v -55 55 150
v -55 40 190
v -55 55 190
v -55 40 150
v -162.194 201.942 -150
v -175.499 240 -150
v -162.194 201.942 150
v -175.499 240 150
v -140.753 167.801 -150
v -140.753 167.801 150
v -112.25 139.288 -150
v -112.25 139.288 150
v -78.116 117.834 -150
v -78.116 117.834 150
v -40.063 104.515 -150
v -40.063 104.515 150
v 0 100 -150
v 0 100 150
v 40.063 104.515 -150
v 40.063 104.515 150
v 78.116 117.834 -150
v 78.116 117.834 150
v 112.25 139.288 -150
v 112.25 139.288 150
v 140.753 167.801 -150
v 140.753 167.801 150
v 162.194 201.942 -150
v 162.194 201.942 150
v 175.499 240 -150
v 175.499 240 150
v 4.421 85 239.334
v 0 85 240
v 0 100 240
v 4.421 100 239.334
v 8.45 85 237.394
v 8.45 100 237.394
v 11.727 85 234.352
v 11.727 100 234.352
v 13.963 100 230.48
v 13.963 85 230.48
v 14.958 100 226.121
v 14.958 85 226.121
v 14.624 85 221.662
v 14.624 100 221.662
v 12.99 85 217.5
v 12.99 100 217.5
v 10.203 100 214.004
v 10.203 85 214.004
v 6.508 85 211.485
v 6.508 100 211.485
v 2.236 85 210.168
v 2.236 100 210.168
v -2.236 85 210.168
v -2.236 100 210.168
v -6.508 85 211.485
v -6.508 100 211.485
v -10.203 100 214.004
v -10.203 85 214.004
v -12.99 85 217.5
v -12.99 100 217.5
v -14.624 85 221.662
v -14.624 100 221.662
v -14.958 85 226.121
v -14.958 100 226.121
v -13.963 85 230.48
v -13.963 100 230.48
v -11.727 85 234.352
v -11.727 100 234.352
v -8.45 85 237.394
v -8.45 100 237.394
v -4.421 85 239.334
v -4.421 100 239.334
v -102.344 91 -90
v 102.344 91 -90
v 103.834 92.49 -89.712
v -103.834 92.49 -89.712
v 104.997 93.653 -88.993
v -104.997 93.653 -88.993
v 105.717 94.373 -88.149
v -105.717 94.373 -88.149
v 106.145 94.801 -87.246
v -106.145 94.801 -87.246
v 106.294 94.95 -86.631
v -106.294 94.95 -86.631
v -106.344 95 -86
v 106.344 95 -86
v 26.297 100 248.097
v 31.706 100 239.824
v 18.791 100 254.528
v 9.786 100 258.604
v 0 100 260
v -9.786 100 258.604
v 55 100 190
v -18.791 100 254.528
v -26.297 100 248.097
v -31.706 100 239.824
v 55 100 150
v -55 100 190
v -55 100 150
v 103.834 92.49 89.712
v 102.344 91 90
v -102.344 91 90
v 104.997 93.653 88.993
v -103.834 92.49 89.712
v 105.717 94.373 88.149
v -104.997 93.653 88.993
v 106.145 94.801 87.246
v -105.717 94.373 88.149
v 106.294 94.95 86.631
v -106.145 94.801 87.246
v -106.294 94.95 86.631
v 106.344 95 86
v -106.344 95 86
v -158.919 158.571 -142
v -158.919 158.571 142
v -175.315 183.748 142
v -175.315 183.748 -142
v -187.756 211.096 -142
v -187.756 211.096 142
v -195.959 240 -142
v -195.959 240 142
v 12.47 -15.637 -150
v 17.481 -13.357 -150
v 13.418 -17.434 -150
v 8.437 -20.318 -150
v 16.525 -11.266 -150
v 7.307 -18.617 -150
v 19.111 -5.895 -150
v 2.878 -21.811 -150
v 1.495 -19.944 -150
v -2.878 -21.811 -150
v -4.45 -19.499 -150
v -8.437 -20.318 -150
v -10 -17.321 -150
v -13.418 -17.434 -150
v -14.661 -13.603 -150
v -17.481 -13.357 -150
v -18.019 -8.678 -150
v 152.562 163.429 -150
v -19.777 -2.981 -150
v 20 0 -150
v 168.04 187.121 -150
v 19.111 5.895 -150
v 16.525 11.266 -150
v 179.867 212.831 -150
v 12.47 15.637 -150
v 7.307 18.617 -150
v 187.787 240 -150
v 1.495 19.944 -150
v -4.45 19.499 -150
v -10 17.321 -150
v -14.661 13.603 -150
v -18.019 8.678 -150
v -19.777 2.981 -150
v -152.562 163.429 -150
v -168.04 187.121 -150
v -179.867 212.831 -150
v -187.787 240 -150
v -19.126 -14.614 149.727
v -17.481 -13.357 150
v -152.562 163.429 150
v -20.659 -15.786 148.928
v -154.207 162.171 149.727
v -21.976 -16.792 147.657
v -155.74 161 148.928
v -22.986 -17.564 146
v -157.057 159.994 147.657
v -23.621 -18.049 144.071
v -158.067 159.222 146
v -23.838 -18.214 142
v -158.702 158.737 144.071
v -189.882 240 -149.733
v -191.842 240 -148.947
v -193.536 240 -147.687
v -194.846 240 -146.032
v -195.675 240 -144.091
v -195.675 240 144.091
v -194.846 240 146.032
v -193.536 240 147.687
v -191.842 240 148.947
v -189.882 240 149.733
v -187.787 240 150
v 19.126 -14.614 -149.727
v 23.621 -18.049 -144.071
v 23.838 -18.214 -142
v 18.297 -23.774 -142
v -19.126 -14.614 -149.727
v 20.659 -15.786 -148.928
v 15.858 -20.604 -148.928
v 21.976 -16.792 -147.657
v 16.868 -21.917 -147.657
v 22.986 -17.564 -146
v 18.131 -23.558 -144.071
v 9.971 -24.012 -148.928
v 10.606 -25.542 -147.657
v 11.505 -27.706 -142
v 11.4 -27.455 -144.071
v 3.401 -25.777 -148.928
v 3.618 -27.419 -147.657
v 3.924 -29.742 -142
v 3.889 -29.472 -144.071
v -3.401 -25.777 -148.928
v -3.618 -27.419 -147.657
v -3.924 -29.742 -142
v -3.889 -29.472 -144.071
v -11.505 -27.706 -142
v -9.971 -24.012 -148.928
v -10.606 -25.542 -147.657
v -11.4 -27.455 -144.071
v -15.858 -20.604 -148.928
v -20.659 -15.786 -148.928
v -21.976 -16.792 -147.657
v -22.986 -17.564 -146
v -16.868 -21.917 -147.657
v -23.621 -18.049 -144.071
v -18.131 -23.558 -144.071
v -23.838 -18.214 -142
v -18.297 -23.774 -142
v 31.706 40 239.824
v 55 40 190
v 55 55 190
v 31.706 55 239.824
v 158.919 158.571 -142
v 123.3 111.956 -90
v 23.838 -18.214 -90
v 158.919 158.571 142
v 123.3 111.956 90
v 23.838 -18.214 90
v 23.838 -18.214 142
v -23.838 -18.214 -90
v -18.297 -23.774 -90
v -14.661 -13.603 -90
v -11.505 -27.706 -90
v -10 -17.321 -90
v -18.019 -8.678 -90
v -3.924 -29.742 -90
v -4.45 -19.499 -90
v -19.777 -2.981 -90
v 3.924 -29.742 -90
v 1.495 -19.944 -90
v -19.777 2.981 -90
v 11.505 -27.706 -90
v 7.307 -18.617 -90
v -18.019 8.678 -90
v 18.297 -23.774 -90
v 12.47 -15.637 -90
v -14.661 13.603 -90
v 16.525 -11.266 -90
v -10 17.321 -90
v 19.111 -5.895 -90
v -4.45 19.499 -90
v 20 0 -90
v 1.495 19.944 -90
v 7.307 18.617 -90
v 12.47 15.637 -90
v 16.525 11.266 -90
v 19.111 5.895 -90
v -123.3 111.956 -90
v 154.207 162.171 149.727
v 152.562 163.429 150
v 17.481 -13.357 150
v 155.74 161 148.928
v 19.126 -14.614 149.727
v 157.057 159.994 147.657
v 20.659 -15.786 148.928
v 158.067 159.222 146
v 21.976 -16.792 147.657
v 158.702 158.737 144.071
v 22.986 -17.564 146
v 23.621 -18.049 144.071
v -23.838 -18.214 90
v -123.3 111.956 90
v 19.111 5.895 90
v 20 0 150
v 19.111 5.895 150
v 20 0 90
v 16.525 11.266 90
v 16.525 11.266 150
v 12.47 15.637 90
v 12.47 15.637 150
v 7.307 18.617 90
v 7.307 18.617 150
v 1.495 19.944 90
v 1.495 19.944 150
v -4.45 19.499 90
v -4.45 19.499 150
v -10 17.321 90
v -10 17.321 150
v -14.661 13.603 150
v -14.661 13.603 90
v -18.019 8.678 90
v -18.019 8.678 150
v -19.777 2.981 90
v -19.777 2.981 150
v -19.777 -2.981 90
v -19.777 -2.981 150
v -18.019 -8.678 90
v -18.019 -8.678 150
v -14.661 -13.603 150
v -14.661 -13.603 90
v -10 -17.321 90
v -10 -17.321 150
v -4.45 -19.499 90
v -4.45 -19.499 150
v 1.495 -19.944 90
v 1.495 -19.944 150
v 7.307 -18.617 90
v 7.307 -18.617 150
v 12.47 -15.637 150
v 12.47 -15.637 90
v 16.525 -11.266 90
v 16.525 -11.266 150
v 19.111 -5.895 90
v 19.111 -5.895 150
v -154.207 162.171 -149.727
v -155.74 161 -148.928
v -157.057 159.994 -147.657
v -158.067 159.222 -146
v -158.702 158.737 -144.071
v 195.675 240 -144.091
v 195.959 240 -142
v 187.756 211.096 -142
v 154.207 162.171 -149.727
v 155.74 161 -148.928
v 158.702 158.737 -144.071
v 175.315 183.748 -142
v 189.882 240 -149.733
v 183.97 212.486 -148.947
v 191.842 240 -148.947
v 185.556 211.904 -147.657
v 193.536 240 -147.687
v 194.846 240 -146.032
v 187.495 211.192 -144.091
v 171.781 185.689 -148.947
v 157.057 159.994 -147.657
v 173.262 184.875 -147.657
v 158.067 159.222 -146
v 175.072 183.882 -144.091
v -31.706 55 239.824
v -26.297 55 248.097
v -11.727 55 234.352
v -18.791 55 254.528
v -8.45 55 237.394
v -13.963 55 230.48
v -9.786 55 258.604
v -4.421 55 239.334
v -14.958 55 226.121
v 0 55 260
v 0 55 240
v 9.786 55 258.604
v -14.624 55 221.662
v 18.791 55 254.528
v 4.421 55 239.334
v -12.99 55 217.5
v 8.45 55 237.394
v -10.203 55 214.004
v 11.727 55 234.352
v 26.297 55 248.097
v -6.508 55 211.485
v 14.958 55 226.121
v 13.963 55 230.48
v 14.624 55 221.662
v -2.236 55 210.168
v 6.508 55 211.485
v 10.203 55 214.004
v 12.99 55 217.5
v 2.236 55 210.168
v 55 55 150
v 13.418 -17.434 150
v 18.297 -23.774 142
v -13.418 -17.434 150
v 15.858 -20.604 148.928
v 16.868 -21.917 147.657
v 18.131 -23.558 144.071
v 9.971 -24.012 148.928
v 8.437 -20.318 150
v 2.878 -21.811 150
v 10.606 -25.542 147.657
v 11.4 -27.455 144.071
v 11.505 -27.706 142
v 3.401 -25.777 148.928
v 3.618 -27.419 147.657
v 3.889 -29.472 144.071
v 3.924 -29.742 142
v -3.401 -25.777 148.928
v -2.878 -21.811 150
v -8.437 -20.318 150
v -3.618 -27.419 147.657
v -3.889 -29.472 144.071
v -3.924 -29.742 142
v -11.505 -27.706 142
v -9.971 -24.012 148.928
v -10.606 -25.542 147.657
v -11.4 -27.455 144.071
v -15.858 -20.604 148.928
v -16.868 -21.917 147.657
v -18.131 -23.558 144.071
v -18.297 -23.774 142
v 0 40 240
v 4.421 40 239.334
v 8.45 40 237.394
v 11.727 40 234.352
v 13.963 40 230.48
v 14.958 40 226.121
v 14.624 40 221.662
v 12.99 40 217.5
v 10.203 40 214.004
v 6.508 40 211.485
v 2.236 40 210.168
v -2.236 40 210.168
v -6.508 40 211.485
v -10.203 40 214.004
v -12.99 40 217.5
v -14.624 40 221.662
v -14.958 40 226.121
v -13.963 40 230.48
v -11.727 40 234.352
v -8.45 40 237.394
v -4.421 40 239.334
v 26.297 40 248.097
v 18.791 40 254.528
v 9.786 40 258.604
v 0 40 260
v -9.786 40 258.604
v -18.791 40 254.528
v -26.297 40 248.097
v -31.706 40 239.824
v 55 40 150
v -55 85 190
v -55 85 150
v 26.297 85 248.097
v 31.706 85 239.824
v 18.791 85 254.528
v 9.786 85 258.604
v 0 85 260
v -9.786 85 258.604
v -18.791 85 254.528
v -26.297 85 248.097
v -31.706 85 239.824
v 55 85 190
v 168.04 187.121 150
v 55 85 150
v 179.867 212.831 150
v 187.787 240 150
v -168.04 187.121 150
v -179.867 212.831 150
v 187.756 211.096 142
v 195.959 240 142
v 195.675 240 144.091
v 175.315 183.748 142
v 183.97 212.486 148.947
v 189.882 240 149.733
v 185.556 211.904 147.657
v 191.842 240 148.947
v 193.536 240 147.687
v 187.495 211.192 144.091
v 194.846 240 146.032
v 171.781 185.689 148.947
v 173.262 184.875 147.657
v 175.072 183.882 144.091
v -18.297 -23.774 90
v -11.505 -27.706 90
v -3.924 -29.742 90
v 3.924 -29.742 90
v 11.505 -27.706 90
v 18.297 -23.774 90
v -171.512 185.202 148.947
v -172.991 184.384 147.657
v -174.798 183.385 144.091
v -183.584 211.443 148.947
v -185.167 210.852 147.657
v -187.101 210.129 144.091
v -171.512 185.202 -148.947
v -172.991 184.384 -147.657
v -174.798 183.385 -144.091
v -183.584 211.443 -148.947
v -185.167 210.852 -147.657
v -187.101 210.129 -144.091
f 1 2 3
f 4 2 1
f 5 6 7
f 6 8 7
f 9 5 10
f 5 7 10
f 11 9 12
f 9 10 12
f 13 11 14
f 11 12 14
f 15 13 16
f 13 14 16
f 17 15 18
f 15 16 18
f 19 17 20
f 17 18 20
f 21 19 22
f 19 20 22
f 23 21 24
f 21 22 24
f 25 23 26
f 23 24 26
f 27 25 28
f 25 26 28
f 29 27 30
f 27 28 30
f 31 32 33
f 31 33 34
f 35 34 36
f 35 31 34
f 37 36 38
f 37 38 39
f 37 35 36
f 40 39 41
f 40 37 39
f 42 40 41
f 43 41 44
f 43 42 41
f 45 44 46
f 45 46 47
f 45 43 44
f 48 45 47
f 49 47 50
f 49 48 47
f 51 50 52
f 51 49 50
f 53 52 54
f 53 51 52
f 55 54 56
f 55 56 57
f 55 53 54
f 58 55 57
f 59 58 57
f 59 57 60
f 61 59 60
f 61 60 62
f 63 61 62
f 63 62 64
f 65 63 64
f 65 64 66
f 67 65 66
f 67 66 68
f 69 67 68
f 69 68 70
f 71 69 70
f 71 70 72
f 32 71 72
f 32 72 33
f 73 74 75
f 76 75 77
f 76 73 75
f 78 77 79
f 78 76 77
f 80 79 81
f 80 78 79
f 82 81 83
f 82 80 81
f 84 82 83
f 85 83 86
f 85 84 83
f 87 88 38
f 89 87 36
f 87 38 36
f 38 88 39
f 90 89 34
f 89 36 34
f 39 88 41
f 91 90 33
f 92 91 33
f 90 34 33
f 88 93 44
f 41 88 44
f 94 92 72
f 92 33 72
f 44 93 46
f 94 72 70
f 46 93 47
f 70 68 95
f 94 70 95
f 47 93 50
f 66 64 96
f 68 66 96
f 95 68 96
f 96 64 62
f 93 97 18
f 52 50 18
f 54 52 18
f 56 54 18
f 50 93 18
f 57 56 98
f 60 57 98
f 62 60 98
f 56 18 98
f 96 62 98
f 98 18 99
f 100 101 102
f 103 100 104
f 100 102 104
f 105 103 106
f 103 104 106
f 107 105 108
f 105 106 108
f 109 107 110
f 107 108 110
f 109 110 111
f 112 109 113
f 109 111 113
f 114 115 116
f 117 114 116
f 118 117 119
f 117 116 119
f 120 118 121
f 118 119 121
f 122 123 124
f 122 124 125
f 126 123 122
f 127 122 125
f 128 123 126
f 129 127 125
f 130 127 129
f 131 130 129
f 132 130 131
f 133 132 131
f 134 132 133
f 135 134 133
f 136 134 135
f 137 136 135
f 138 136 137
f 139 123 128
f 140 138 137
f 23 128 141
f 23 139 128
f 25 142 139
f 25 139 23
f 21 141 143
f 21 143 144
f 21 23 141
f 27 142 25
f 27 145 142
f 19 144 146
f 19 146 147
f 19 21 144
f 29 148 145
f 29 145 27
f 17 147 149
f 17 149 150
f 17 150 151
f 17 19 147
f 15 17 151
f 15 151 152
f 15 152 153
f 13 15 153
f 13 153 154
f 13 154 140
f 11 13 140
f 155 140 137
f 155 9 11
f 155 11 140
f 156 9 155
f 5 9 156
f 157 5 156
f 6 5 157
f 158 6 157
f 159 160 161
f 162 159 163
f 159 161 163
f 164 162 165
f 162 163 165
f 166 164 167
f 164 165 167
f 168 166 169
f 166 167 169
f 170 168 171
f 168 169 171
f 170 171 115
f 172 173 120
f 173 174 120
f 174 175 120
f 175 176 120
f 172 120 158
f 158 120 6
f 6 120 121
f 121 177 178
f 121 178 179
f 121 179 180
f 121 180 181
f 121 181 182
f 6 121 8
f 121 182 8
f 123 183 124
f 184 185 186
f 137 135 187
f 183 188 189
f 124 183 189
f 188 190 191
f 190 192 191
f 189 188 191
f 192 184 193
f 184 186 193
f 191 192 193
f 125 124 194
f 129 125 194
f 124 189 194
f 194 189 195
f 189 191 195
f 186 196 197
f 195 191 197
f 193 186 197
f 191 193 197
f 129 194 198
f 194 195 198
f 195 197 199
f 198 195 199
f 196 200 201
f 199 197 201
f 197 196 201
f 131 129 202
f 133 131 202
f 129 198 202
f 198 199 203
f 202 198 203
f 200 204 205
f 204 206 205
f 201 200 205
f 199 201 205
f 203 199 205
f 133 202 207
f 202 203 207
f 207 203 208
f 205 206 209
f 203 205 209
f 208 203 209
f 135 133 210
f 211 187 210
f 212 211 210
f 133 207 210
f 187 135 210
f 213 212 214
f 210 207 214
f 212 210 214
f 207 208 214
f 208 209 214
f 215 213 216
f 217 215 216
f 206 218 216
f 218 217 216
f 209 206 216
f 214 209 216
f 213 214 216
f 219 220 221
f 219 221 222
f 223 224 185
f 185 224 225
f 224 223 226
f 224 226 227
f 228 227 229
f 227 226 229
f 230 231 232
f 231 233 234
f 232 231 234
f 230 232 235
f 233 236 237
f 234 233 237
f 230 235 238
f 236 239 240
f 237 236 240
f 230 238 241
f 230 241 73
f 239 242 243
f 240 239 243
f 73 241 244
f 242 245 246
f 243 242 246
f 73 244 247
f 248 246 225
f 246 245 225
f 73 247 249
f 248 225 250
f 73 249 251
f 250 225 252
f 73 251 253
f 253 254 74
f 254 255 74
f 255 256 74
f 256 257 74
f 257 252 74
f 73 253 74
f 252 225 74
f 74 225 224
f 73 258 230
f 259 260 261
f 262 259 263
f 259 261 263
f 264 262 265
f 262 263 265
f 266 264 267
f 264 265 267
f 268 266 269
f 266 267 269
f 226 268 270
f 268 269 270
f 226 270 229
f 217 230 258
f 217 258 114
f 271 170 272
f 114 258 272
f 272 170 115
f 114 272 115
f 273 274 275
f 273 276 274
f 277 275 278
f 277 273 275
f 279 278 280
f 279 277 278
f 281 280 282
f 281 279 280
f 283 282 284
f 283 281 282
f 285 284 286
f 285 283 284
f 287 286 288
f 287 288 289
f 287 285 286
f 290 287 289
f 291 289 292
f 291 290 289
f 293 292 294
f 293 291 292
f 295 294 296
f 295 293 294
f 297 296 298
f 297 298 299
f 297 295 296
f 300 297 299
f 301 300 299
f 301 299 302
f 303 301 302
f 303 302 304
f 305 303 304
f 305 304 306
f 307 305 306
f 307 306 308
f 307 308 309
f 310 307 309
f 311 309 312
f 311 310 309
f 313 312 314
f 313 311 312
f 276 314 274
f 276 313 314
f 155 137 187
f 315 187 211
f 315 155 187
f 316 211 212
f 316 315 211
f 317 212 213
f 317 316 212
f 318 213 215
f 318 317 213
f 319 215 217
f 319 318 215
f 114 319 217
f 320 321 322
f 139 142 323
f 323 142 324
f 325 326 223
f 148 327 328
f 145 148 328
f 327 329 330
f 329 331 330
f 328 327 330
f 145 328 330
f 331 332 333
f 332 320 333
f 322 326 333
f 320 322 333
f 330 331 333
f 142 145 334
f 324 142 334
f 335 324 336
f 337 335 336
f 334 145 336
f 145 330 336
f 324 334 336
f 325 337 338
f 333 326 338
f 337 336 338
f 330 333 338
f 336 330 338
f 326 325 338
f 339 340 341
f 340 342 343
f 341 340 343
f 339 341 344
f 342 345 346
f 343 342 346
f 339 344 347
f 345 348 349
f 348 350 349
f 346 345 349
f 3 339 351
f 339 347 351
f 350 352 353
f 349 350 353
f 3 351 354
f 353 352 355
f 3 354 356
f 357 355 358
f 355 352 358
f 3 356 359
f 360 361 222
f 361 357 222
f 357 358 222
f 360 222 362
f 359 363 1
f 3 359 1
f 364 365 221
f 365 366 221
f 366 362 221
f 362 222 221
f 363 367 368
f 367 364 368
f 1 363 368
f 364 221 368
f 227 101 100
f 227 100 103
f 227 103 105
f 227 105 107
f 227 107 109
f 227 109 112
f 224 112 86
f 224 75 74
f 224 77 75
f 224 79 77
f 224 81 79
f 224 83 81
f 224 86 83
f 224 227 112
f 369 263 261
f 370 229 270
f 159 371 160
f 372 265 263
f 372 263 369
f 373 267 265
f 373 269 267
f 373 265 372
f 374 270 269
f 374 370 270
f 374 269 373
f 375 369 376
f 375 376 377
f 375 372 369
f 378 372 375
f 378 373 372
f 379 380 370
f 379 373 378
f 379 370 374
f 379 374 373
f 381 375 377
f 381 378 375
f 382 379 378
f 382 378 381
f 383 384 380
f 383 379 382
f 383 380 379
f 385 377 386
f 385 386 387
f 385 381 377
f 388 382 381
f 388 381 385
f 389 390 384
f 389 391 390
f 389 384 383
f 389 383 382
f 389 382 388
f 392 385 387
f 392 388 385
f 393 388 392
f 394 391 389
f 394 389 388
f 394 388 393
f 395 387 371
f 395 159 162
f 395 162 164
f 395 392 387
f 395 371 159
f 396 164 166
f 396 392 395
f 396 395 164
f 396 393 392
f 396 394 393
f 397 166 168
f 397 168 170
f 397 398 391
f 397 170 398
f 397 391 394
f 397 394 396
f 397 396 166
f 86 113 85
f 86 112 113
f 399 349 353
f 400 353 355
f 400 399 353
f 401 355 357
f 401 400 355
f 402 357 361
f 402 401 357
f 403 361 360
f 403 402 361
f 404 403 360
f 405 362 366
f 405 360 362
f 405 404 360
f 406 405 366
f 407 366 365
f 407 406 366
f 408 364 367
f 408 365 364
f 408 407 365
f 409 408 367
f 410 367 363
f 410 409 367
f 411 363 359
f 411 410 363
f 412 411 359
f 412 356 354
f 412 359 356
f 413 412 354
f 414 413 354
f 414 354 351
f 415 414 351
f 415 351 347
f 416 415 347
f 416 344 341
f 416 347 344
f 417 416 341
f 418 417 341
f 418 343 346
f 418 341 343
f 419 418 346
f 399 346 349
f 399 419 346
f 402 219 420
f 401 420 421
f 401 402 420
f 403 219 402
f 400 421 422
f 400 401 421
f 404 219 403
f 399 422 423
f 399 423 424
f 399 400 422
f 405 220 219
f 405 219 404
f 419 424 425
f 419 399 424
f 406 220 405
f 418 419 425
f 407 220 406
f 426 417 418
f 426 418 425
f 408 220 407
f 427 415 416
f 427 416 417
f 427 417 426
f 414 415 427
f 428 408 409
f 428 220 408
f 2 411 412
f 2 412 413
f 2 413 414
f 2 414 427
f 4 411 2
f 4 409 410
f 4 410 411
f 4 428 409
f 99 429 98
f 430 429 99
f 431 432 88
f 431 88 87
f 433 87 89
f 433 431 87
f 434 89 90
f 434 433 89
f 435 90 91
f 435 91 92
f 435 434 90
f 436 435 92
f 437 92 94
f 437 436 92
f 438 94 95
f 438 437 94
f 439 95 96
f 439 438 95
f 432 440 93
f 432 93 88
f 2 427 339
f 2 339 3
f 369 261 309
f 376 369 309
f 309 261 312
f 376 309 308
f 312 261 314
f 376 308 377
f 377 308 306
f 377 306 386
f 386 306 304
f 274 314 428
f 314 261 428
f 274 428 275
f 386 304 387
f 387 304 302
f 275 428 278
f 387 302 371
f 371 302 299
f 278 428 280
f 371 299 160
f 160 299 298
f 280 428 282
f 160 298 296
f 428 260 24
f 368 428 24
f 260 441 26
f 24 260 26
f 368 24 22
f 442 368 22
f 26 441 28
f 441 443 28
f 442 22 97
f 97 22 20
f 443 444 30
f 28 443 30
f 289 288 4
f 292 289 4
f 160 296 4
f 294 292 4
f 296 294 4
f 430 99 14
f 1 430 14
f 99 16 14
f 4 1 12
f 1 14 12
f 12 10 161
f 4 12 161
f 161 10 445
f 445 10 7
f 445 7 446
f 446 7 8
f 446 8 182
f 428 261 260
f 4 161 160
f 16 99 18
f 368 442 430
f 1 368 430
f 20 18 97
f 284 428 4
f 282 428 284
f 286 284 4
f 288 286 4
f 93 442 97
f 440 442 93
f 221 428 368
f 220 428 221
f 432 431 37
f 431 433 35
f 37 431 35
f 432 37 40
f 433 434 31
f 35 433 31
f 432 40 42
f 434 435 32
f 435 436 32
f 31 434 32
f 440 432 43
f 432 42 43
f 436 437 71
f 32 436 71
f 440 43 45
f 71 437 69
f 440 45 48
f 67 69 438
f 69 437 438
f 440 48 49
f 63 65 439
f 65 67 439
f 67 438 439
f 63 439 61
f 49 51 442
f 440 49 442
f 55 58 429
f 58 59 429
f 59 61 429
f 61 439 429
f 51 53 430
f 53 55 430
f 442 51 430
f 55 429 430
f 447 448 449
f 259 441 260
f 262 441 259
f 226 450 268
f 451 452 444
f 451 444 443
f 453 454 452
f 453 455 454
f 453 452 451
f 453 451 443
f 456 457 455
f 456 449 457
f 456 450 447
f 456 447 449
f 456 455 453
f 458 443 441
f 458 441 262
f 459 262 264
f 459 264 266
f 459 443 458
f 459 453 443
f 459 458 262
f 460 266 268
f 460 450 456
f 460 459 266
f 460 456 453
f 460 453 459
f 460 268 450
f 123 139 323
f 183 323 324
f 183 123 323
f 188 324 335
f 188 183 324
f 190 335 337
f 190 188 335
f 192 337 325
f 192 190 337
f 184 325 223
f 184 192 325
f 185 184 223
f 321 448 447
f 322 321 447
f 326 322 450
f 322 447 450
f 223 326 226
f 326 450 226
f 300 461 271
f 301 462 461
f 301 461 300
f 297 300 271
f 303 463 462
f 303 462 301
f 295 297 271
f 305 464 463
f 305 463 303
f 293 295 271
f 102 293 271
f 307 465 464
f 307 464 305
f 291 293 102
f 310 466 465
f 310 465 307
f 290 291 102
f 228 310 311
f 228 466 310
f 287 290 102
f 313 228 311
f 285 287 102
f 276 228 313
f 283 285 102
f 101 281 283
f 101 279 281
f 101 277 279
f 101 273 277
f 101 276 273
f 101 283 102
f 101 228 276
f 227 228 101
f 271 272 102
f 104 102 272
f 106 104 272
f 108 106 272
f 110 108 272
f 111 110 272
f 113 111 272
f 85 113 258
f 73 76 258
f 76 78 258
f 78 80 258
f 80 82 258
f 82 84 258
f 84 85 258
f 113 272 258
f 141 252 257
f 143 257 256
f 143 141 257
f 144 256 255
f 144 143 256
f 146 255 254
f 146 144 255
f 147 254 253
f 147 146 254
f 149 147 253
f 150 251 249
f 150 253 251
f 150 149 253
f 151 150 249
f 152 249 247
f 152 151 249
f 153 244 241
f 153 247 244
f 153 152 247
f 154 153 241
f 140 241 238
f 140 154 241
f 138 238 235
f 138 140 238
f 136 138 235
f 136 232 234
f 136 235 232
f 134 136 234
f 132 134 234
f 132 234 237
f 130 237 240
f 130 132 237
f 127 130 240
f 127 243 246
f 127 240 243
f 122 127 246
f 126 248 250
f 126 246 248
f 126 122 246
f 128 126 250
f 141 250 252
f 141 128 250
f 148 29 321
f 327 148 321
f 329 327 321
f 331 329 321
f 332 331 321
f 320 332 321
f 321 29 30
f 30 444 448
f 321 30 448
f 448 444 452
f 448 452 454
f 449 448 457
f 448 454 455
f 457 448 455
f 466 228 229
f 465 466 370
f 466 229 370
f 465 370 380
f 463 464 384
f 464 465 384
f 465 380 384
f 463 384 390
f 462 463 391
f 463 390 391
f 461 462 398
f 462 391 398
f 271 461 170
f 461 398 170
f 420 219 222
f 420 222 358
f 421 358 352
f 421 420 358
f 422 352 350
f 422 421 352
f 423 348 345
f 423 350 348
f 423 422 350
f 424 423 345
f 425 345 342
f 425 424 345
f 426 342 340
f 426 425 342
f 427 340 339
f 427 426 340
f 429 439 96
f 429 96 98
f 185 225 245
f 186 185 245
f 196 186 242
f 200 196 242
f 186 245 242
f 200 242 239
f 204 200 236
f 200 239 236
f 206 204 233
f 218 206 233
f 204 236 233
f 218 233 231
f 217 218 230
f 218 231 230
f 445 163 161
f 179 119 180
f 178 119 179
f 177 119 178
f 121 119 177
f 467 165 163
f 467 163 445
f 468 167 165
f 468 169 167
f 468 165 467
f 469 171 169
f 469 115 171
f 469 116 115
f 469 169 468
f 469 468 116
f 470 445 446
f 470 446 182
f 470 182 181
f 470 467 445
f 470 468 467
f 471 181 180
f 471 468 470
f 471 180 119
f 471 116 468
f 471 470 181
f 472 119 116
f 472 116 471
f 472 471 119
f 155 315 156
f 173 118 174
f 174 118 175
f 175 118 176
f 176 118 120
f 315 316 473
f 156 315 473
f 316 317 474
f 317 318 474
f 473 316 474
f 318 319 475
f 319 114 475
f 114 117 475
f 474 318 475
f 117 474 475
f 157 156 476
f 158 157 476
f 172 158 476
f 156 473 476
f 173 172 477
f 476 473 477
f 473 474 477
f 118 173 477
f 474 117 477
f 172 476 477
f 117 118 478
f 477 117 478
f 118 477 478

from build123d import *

# Parameters (mm, degrees)
SKETCH1_R               = 20
BOSS_EXTRUDE1_DEPTH     = 150
BOSS_EXTRUDE2_START     = 40
SKETCH2_R               = 15
BOSS_EXTRUDE2_DEPTH     = 60
SKETCH3_W               = 162.009512726
SKETCH3_H               = 30
CUT_EXTRUDE1_DEPTH      = 405.474968323
CUT_EXTRUDE1_DEPTH_BACK = 405.474968323
SKETCH4_W               = 180
SKETCH4_H               = 153.149018845
CUT_EXTRUDE2_DEPTH      = 405.474968323
CUT_EXTRUDE2_DEPTH_BACK = 405.474968323
CHAMFER1_SIZE           = 4
CHAMFER1_SIZE2          = 21.339042193
CHAMFER1_EDGE_2_SIZE    = 4
CHAMFER1_EDGE_2_SIZE2   = 21.339042193
FILLET1_R               = 4
FILLET2_R               = 8


with BuildPart() as part:
    # Sketch1 → Boss-Extrude1 (new, symmetric)
    with BuildSketch(Plane.XY):
        with BuildLine():
            Line((-195.959179423, 240), (-175.499287748, 240))
            ThreePointArc((-175.499287748, 240), (0, 100), (175.499287748, 240))
            Line((175.499287748, 240), (195.959179423, 240))
            ThreePointArc((195.959179423, 240), (182.049998135, 197.188176092), (158.918539009, 158.571428571))
            Line((158.918539009, 158.571428571), (23.837780851, -18.214285714))
            ThreePointArc((23.837780851, -18.214285714), (0, -30), (-23.837780851, -18.214285714))
            Line((-23.837780851, -18.214285714), (-158.918539009, 158.571428571))
            ThreePointArc((-158.918539009, 158.571428571), (-182.049998135, 197.188176092), (-195.959179423, 240))
        make_face()
        Circle(SKETCH1_R, mode=Mode.SUBTRACT)
    extrude(amount=BOSS_EXTRUDE1_DEPTH, both=True)

    # Sketch2 → Boss-Extrude2 (add)
    with BuildSketch(Plane(origin=(0, 0, 0), x_dir=(1, 0, 0), z_dir=(0, 1, 0)).offset(BOSS_EXTRUDE2_START)):
        with BuildLine():
            Line((-55, -150), (55, -150))
            Line((55, -150), (55, -190))
            Line((55, -190), (31.705882353, -239.823529412))
            ThreePointArc((31.705882353, -239.823529412), (0, -260), (-31.705882353, -239.823529412))
            Line((-31.705882353, -239.823529412), (-55, -190))
            Line((-55, -190), (-55, -150))
        make_face()
        with Locations(Location((0, -225, 0), (0, 0, 270))):
            Circle(SKETCH2_R, mode=Mode.SUBTRACT)
    extrude(amount=BOSS_EXTRUDE2_DEPTH)

    # Sketch3 → Cut-Extrude1 (cut, two sides)
    with BuildSketch(Plane(origin=(0, 0, 0), x_dir=(0, 0, -1), z_dir=(1, 0, 0))) as cut_extrude1_sk:
        with Locations((-231.004756363, 70)):
            Rectangle(SKETCH3_W, SKETCH3_H)
    extrude(amount=CUT_EXTRUDE1_DEPTH, mode=Mode.SUBTRACT)
    extrude(cut_extrude1_sk.sketch, amount=-CUT_EXTRUDE1_DEPTH_BACK, mode=Mode.SUBTRACT)

    # Sketch4 → Cut-Extrude2 (cut, two sides)
    with BuildSketch(Plane(origin=(0, 0, 0), x_dir=(0, 0, -1), z_dir=(1, 0, 0))) as cut_extrude2_sk:
        with Locations((0, 18.425490577)):
            Rectangle(SKETCH4_W, SKETCH4_H)
    extrude(amount=CUT_EXTRUDE2_DEPTH, mode=Mode.SUBTRACT)
    extrude(cut_extrude2_sk.sketch, amount=-CUT_EXTRUDE2_DEPTH_BACK, mode=Mode.SUBTRACT)

    # Chamfer1
    chamfer1_edges = [part.edges().sort_by_distance(p)[0] for p in [
        (110.344044156, 95, 0),
    ]]
    chamfer1_side = [part.faces().sort_by_distance(p)[0] for p in [
        (0, 95, 0),
    ]]
    chamfer(chamfer1_edges, length=CHAMFER1_SIZE, length2=CHAMFER1_SIZE2, reference=chamfer1_side[0])

    # Chamfer1 edge 2
    chamfer1_edge_2_edges = [part.edges().sort_by_distance(p)[0] for p in [
        (-110.344044156, 95, 0),
    ]]
    chamfer1_edge_2_side = [part.faces().sort_by_distance(p)[0] for p in [
        (0, 95, 0),
    ]]
    chamfer(chamfer1_edge_2_edges, length=CHAMFER1_EDGE_2_SIZE, length2=CHAMFER1_EDGE_2_SIZE2, reference=chamfer1_edge_2_side[0])

    # Fillet1
    fillet1_edges = [part.edges().sort_by_distance(p)[0] for p in [
        (0, 95, -90),
        (0, 95, 90),
    ]]
    fillet(fillet1_edges, radius=FILLET1_R)

    # Fillet2
    fillet2_edges = [part.edges().sort_by_distance(p)[0] for p in [
        (-91.37815993, 70.178571429, -150),
        (-182.049998135, 197.188176092, -150),
        (-182.049998135, 197.188176092, 150),
        (-91.37815993, 70.178571429, 150),
        (0, -30, 150),
        (91.37815993, 70.178571429, 150),
        (182.049998135, 197.188176092, 150),
        (182.049998135, 197.188176092, -150),
        (91.37815993, 70.178571429, -150),
        (0, -30, -150),
    ]]
    fillet(fillet2_edges, radius=FILLET2_R)


solid = part.part
